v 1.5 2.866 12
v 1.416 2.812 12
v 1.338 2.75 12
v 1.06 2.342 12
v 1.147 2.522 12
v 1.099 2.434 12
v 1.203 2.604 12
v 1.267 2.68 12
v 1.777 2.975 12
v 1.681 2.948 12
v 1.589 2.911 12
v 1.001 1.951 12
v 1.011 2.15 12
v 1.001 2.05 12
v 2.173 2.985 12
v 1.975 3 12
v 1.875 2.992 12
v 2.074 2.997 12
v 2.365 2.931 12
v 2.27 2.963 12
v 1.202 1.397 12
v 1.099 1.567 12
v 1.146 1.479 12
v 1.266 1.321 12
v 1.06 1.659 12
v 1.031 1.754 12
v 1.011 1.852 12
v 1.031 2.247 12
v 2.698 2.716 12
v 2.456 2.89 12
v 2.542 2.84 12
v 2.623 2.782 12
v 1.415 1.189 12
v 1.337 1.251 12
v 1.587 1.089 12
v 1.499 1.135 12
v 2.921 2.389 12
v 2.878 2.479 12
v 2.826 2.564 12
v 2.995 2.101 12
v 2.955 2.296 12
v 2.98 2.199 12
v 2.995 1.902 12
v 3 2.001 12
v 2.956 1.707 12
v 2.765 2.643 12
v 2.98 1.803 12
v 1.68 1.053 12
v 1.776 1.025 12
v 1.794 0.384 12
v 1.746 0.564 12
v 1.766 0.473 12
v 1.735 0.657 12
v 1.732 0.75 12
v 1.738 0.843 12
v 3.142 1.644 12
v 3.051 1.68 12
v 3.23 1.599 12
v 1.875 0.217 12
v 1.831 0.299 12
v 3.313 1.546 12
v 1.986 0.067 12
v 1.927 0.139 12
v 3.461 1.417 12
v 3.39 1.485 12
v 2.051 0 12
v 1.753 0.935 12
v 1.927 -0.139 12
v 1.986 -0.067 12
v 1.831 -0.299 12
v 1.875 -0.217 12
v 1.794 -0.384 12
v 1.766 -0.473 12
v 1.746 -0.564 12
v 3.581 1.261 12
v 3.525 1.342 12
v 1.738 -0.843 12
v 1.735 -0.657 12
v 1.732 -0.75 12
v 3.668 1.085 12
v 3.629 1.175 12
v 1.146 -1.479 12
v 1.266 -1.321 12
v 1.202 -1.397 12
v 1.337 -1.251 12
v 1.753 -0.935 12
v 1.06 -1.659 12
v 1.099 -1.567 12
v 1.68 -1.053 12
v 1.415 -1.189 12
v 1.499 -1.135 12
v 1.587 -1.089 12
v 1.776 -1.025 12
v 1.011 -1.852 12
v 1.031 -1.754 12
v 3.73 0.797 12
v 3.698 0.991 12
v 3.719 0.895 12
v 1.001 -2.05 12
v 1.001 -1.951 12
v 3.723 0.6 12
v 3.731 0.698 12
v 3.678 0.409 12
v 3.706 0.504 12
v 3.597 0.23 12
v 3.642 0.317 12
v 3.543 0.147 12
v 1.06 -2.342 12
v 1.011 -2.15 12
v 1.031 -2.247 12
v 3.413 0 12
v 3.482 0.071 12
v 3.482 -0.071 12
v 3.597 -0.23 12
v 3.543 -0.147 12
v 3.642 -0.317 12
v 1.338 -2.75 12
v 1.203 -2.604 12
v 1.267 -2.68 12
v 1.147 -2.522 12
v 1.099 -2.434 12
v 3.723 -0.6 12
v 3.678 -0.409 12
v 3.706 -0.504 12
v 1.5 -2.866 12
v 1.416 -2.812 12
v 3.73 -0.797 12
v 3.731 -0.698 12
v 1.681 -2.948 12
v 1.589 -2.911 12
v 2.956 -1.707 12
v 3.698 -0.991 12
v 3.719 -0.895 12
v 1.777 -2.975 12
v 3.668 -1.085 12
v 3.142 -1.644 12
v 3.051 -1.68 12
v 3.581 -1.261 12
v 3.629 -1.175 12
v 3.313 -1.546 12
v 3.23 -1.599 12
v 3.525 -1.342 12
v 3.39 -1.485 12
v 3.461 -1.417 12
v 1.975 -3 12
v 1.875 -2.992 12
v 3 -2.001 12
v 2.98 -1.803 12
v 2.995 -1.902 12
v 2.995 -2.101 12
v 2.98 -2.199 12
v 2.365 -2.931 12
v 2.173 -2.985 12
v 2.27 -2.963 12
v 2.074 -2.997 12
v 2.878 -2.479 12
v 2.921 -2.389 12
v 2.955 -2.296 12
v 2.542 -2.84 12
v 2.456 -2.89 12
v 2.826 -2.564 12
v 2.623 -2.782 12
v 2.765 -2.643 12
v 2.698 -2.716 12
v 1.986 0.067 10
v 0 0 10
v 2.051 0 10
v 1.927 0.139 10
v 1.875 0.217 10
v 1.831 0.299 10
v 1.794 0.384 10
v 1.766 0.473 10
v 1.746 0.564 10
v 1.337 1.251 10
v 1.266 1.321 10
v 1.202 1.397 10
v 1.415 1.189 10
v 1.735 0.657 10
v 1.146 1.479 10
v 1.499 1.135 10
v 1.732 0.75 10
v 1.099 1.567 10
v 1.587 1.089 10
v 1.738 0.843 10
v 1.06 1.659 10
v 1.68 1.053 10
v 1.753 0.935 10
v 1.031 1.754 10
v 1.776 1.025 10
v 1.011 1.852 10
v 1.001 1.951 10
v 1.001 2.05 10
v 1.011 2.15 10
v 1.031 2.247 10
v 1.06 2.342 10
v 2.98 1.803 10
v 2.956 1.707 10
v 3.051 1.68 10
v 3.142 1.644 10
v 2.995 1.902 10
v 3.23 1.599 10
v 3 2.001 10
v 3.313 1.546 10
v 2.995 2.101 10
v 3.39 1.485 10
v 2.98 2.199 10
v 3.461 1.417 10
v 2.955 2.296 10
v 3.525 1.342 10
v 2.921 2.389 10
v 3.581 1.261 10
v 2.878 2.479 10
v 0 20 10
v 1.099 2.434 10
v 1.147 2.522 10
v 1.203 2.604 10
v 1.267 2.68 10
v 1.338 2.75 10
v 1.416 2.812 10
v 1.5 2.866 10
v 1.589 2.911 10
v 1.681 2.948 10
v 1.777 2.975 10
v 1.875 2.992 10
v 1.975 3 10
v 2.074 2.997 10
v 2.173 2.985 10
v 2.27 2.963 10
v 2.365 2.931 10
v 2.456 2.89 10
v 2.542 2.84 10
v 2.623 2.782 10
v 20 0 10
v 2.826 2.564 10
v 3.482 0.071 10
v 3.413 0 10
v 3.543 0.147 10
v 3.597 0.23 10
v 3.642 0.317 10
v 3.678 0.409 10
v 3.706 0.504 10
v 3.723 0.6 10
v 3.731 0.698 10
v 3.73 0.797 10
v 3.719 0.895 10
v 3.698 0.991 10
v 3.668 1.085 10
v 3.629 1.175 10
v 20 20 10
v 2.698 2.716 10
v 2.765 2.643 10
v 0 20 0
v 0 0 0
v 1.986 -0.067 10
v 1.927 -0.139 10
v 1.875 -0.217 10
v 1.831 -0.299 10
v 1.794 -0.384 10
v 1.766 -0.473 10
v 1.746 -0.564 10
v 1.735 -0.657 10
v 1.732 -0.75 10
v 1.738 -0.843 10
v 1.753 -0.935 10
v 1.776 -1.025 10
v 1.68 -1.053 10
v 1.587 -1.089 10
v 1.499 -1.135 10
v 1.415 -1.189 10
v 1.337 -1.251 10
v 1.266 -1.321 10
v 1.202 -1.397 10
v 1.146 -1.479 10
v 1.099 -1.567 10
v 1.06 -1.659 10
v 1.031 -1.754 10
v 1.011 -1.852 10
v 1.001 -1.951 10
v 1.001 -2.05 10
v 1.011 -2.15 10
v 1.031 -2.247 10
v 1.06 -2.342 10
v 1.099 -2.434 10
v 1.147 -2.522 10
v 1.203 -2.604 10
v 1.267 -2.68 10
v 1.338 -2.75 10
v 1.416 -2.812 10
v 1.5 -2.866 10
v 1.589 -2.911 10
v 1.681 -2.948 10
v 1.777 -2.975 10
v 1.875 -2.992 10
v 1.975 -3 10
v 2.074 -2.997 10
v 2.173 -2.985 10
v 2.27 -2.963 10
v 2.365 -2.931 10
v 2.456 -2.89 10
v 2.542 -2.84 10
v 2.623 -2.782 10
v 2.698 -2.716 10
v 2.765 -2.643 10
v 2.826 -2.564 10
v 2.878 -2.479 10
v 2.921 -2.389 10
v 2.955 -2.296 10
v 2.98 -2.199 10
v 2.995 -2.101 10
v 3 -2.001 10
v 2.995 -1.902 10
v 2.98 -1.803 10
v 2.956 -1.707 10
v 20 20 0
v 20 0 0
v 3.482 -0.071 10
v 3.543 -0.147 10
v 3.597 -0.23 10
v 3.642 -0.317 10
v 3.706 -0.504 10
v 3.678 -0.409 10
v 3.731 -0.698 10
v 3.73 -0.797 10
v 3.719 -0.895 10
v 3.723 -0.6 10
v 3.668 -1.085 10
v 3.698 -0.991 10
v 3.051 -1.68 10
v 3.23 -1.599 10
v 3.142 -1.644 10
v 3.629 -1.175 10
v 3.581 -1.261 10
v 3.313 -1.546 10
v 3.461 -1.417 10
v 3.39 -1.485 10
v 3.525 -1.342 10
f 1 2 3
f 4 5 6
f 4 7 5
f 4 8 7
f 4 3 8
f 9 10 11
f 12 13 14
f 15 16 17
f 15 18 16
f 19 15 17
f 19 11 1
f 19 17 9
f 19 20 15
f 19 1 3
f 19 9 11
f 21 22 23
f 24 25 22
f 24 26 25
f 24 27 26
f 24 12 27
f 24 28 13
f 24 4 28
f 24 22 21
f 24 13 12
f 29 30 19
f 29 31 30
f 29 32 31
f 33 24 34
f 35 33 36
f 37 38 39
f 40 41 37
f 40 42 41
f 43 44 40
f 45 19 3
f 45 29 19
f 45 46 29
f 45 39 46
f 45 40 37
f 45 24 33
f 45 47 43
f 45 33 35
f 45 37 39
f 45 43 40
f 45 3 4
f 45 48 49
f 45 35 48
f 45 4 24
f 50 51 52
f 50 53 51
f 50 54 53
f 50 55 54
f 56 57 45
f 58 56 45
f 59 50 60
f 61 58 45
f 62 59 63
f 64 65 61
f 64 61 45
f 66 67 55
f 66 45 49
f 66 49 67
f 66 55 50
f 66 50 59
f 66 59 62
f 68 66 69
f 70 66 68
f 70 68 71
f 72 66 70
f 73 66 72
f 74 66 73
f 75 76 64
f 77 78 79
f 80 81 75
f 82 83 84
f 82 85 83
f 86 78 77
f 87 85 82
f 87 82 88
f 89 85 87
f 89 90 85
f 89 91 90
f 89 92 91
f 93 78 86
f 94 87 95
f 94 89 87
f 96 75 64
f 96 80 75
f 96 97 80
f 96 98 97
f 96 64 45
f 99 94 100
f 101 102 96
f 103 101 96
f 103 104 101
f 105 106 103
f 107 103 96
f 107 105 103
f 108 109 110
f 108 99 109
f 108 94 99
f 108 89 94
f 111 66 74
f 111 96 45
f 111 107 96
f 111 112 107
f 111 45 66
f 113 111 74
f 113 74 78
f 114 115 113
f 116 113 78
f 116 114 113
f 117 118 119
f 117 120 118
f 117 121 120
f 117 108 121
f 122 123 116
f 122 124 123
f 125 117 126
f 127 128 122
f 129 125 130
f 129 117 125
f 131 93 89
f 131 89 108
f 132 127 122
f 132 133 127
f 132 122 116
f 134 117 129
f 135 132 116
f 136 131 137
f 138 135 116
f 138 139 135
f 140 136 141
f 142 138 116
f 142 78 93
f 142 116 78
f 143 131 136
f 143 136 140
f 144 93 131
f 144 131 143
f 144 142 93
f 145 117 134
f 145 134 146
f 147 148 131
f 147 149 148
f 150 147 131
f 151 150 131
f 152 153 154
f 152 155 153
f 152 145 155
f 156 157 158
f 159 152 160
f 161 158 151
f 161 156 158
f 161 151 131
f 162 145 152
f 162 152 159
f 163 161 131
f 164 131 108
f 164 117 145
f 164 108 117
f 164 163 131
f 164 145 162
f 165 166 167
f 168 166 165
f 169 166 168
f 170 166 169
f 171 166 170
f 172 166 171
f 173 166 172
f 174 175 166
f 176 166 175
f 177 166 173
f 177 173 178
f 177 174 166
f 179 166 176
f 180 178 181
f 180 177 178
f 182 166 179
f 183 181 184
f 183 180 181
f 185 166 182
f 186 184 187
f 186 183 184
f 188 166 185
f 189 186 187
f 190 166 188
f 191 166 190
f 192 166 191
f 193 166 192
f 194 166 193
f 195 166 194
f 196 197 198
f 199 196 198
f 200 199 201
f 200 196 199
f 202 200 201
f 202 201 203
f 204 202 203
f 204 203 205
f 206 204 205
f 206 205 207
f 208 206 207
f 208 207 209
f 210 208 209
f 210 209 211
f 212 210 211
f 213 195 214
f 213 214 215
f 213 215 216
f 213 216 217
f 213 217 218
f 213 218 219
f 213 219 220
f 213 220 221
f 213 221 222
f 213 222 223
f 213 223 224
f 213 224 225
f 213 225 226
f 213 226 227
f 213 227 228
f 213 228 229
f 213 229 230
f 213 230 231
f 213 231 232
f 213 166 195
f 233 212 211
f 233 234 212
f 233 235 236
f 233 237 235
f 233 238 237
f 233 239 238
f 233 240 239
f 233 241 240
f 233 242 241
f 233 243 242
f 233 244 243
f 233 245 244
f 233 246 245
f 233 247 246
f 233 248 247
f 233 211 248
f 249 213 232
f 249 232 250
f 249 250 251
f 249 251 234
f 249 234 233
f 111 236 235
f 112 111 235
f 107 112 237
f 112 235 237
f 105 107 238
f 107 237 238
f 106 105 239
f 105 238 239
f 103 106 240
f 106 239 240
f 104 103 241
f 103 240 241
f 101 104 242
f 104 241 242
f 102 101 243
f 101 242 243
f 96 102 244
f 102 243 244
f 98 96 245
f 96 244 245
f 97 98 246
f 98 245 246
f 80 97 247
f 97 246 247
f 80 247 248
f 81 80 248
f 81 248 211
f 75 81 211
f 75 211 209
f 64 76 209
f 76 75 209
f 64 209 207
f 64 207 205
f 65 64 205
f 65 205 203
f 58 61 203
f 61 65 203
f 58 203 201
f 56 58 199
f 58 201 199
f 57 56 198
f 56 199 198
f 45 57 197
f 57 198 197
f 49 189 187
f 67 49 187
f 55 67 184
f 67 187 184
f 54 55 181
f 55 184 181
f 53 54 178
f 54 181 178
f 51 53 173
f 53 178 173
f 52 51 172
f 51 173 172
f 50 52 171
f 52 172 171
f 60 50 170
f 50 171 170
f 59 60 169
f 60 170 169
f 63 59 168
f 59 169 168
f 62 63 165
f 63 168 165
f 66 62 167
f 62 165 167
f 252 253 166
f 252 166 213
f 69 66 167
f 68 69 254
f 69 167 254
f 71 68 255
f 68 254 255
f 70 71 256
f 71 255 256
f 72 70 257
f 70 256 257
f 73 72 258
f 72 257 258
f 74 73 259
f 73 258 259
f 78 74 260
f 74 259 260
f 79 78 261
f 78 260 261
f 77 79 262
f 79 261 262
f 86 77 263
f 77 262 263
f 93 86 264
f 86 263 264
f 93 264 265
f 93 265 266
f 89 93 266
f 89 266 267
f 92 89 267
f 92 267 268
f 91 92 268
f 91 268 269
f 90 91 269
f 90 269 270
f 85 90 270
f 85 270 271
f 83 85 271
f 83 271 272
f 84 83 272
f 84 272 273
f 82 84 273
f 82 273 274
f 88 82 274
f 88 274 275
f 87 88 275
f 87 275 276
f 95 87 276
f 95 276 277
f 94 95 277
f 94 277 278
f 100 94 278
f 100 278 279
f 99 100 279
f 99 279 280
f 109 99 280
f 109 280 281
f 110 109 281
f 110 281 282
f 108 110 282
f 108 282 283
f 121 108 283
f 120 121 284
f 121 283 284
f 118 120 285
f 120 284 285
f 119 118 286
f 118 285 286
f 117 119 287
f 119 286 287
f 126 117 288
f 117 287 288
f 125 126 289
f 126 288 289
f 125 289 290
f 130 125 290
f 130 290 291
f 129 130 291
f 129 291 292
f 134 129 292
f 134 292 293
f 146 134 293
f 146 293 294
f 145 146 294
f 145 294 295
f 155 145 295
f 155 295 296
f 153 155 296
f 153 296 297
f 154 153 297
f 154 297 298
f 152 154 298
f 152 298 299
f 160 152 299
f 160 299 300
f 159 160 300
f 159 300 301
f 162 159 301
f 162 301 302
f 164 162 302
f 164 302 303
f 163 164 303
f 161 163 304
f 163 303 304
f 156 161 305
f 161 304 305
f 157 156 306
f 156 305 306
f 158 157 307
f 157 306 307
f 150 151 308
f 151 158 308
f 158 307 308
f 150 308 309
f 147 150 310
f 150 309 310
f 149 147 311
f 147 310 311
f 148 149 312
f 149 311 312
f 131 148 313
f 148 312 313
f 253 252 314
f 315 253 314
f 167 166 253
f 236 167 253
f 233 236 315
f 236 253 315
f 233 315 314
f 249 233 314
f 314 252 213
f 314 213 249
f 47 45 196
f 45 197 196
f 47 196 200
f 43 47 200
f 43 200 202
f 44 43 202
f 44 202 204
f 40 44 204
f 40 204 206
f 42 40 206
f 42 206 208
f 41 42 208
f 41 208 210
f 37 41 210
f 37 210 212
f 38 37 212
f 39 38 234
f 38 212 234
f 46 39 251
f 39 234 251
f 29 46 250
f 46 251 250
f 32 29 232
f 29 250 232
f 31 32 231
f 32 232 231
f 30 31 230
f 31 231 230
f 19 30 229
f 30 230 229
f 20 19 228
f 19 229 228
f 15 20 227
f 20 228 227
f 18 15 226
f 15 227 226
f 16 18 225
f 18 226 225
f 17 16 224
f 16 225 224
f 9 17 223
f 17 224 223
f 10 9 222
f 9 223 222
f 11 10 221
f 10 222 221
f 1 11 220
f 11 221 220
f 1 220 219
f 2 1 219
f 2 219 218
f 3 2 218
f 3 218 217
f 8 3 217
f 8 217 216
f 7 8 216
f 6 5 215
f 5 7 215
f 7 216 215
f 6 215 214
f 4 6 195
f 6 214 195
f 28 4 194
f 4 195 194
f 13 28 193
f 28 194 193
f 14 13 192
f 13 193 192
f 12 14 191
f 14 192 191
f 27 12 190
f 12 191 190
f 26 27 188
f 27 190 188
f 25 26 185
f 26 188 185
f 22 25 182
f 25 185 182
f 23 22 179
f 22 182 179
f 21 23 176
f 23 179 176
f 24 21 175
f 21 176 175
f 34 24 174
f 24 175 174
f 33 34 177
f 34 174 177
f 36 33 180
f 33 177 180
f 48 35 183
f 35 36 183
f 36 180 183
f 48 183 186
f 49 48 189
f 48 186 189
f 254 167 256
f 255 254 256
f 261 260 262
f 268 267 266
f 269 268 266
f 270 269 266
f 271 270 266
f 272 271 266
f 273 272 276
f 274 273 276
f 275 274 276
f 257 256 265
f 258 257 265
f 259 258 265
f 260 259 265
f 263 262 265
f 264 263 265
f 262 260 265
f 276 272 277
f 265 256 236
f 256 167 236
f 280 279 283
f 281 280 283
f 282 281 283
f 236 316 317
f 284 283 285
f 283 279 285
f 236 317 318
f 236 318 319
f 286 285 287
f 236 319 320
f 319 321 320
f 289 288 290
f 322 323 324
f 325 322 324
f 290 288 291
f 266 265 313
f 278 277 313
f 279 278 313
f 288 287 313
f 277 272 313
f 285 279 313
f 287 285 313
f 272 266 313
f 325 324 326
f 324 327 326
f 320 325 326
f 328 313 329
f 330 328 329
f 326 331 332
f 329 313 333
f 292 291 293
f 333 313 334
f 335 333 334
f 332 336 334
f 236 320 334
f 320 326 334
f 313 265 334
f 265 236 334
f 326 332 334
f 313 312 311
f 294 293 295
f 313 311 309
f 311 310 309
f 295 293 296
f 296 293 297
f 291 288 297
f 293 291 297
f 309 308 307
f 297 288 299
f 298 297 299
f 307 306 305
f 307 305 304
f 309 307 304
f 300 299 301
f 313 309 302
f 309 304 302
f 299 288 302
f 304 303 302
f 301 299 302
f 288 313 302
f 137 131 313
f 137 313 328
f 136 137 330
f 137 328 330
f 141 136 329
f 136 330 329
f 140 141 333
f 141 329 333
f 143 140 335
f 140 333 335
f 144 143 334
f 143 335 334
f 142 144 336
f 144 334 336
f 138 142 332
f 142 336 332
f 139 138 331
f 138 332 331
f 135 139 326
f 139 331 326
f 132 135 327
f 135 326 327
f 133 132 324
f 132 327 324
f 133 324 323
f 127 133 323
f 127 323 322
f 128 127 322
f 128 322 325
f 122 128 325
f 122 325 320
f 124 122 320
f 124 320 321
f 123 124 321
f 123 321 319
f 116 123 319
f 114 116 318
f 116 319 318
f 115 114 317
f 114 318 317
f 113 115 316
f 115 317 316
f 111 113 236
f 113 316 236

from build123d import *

# Parameters (mm, degrees)
SKETCH_1_W            = 20
SKETCH_1_H            = 20
BASEBOX_DEPTH         = 10
SKETCH_2_R            = 1
BOSSSEED_DEPTH        = 2
CIRCULARPATTERN_COUNT = 4
CIRCULARPATTERN_ANGLE = 90


with BuildPart() as part:
    # 草图1 → BaseBox (new body)
    with BuildSketch(Plane.XY):
        with Locations((10, 10)):
            Rectangle(SKETCH_1_W, SKETCH_1_H)
    extrude(amount=BASEBOX_DEPTH)

    # 草图2 → BossSeed (add)
    with BuildSketch(Plane.XY.offset(10)):
        with Locations((2, 2)):
            Circle(SKETCH_2_R)
    bossseed = extrude(amount=BOSSSEED_DEPTH)

    # CircularPattern: BossSeed ×4 about axis
    circularpattern_axis = Axis((0, 0, 0), (0, 0, -1))
    for i in range(1, CIRCULARPATTERN_COUNT):
        add(bossseed.rotate(circularpattern_axis, i * CIRCULARPATTERN_ANGLE / (CIRCULARPATTERN_COUNT - 1)))


solid = part.part
